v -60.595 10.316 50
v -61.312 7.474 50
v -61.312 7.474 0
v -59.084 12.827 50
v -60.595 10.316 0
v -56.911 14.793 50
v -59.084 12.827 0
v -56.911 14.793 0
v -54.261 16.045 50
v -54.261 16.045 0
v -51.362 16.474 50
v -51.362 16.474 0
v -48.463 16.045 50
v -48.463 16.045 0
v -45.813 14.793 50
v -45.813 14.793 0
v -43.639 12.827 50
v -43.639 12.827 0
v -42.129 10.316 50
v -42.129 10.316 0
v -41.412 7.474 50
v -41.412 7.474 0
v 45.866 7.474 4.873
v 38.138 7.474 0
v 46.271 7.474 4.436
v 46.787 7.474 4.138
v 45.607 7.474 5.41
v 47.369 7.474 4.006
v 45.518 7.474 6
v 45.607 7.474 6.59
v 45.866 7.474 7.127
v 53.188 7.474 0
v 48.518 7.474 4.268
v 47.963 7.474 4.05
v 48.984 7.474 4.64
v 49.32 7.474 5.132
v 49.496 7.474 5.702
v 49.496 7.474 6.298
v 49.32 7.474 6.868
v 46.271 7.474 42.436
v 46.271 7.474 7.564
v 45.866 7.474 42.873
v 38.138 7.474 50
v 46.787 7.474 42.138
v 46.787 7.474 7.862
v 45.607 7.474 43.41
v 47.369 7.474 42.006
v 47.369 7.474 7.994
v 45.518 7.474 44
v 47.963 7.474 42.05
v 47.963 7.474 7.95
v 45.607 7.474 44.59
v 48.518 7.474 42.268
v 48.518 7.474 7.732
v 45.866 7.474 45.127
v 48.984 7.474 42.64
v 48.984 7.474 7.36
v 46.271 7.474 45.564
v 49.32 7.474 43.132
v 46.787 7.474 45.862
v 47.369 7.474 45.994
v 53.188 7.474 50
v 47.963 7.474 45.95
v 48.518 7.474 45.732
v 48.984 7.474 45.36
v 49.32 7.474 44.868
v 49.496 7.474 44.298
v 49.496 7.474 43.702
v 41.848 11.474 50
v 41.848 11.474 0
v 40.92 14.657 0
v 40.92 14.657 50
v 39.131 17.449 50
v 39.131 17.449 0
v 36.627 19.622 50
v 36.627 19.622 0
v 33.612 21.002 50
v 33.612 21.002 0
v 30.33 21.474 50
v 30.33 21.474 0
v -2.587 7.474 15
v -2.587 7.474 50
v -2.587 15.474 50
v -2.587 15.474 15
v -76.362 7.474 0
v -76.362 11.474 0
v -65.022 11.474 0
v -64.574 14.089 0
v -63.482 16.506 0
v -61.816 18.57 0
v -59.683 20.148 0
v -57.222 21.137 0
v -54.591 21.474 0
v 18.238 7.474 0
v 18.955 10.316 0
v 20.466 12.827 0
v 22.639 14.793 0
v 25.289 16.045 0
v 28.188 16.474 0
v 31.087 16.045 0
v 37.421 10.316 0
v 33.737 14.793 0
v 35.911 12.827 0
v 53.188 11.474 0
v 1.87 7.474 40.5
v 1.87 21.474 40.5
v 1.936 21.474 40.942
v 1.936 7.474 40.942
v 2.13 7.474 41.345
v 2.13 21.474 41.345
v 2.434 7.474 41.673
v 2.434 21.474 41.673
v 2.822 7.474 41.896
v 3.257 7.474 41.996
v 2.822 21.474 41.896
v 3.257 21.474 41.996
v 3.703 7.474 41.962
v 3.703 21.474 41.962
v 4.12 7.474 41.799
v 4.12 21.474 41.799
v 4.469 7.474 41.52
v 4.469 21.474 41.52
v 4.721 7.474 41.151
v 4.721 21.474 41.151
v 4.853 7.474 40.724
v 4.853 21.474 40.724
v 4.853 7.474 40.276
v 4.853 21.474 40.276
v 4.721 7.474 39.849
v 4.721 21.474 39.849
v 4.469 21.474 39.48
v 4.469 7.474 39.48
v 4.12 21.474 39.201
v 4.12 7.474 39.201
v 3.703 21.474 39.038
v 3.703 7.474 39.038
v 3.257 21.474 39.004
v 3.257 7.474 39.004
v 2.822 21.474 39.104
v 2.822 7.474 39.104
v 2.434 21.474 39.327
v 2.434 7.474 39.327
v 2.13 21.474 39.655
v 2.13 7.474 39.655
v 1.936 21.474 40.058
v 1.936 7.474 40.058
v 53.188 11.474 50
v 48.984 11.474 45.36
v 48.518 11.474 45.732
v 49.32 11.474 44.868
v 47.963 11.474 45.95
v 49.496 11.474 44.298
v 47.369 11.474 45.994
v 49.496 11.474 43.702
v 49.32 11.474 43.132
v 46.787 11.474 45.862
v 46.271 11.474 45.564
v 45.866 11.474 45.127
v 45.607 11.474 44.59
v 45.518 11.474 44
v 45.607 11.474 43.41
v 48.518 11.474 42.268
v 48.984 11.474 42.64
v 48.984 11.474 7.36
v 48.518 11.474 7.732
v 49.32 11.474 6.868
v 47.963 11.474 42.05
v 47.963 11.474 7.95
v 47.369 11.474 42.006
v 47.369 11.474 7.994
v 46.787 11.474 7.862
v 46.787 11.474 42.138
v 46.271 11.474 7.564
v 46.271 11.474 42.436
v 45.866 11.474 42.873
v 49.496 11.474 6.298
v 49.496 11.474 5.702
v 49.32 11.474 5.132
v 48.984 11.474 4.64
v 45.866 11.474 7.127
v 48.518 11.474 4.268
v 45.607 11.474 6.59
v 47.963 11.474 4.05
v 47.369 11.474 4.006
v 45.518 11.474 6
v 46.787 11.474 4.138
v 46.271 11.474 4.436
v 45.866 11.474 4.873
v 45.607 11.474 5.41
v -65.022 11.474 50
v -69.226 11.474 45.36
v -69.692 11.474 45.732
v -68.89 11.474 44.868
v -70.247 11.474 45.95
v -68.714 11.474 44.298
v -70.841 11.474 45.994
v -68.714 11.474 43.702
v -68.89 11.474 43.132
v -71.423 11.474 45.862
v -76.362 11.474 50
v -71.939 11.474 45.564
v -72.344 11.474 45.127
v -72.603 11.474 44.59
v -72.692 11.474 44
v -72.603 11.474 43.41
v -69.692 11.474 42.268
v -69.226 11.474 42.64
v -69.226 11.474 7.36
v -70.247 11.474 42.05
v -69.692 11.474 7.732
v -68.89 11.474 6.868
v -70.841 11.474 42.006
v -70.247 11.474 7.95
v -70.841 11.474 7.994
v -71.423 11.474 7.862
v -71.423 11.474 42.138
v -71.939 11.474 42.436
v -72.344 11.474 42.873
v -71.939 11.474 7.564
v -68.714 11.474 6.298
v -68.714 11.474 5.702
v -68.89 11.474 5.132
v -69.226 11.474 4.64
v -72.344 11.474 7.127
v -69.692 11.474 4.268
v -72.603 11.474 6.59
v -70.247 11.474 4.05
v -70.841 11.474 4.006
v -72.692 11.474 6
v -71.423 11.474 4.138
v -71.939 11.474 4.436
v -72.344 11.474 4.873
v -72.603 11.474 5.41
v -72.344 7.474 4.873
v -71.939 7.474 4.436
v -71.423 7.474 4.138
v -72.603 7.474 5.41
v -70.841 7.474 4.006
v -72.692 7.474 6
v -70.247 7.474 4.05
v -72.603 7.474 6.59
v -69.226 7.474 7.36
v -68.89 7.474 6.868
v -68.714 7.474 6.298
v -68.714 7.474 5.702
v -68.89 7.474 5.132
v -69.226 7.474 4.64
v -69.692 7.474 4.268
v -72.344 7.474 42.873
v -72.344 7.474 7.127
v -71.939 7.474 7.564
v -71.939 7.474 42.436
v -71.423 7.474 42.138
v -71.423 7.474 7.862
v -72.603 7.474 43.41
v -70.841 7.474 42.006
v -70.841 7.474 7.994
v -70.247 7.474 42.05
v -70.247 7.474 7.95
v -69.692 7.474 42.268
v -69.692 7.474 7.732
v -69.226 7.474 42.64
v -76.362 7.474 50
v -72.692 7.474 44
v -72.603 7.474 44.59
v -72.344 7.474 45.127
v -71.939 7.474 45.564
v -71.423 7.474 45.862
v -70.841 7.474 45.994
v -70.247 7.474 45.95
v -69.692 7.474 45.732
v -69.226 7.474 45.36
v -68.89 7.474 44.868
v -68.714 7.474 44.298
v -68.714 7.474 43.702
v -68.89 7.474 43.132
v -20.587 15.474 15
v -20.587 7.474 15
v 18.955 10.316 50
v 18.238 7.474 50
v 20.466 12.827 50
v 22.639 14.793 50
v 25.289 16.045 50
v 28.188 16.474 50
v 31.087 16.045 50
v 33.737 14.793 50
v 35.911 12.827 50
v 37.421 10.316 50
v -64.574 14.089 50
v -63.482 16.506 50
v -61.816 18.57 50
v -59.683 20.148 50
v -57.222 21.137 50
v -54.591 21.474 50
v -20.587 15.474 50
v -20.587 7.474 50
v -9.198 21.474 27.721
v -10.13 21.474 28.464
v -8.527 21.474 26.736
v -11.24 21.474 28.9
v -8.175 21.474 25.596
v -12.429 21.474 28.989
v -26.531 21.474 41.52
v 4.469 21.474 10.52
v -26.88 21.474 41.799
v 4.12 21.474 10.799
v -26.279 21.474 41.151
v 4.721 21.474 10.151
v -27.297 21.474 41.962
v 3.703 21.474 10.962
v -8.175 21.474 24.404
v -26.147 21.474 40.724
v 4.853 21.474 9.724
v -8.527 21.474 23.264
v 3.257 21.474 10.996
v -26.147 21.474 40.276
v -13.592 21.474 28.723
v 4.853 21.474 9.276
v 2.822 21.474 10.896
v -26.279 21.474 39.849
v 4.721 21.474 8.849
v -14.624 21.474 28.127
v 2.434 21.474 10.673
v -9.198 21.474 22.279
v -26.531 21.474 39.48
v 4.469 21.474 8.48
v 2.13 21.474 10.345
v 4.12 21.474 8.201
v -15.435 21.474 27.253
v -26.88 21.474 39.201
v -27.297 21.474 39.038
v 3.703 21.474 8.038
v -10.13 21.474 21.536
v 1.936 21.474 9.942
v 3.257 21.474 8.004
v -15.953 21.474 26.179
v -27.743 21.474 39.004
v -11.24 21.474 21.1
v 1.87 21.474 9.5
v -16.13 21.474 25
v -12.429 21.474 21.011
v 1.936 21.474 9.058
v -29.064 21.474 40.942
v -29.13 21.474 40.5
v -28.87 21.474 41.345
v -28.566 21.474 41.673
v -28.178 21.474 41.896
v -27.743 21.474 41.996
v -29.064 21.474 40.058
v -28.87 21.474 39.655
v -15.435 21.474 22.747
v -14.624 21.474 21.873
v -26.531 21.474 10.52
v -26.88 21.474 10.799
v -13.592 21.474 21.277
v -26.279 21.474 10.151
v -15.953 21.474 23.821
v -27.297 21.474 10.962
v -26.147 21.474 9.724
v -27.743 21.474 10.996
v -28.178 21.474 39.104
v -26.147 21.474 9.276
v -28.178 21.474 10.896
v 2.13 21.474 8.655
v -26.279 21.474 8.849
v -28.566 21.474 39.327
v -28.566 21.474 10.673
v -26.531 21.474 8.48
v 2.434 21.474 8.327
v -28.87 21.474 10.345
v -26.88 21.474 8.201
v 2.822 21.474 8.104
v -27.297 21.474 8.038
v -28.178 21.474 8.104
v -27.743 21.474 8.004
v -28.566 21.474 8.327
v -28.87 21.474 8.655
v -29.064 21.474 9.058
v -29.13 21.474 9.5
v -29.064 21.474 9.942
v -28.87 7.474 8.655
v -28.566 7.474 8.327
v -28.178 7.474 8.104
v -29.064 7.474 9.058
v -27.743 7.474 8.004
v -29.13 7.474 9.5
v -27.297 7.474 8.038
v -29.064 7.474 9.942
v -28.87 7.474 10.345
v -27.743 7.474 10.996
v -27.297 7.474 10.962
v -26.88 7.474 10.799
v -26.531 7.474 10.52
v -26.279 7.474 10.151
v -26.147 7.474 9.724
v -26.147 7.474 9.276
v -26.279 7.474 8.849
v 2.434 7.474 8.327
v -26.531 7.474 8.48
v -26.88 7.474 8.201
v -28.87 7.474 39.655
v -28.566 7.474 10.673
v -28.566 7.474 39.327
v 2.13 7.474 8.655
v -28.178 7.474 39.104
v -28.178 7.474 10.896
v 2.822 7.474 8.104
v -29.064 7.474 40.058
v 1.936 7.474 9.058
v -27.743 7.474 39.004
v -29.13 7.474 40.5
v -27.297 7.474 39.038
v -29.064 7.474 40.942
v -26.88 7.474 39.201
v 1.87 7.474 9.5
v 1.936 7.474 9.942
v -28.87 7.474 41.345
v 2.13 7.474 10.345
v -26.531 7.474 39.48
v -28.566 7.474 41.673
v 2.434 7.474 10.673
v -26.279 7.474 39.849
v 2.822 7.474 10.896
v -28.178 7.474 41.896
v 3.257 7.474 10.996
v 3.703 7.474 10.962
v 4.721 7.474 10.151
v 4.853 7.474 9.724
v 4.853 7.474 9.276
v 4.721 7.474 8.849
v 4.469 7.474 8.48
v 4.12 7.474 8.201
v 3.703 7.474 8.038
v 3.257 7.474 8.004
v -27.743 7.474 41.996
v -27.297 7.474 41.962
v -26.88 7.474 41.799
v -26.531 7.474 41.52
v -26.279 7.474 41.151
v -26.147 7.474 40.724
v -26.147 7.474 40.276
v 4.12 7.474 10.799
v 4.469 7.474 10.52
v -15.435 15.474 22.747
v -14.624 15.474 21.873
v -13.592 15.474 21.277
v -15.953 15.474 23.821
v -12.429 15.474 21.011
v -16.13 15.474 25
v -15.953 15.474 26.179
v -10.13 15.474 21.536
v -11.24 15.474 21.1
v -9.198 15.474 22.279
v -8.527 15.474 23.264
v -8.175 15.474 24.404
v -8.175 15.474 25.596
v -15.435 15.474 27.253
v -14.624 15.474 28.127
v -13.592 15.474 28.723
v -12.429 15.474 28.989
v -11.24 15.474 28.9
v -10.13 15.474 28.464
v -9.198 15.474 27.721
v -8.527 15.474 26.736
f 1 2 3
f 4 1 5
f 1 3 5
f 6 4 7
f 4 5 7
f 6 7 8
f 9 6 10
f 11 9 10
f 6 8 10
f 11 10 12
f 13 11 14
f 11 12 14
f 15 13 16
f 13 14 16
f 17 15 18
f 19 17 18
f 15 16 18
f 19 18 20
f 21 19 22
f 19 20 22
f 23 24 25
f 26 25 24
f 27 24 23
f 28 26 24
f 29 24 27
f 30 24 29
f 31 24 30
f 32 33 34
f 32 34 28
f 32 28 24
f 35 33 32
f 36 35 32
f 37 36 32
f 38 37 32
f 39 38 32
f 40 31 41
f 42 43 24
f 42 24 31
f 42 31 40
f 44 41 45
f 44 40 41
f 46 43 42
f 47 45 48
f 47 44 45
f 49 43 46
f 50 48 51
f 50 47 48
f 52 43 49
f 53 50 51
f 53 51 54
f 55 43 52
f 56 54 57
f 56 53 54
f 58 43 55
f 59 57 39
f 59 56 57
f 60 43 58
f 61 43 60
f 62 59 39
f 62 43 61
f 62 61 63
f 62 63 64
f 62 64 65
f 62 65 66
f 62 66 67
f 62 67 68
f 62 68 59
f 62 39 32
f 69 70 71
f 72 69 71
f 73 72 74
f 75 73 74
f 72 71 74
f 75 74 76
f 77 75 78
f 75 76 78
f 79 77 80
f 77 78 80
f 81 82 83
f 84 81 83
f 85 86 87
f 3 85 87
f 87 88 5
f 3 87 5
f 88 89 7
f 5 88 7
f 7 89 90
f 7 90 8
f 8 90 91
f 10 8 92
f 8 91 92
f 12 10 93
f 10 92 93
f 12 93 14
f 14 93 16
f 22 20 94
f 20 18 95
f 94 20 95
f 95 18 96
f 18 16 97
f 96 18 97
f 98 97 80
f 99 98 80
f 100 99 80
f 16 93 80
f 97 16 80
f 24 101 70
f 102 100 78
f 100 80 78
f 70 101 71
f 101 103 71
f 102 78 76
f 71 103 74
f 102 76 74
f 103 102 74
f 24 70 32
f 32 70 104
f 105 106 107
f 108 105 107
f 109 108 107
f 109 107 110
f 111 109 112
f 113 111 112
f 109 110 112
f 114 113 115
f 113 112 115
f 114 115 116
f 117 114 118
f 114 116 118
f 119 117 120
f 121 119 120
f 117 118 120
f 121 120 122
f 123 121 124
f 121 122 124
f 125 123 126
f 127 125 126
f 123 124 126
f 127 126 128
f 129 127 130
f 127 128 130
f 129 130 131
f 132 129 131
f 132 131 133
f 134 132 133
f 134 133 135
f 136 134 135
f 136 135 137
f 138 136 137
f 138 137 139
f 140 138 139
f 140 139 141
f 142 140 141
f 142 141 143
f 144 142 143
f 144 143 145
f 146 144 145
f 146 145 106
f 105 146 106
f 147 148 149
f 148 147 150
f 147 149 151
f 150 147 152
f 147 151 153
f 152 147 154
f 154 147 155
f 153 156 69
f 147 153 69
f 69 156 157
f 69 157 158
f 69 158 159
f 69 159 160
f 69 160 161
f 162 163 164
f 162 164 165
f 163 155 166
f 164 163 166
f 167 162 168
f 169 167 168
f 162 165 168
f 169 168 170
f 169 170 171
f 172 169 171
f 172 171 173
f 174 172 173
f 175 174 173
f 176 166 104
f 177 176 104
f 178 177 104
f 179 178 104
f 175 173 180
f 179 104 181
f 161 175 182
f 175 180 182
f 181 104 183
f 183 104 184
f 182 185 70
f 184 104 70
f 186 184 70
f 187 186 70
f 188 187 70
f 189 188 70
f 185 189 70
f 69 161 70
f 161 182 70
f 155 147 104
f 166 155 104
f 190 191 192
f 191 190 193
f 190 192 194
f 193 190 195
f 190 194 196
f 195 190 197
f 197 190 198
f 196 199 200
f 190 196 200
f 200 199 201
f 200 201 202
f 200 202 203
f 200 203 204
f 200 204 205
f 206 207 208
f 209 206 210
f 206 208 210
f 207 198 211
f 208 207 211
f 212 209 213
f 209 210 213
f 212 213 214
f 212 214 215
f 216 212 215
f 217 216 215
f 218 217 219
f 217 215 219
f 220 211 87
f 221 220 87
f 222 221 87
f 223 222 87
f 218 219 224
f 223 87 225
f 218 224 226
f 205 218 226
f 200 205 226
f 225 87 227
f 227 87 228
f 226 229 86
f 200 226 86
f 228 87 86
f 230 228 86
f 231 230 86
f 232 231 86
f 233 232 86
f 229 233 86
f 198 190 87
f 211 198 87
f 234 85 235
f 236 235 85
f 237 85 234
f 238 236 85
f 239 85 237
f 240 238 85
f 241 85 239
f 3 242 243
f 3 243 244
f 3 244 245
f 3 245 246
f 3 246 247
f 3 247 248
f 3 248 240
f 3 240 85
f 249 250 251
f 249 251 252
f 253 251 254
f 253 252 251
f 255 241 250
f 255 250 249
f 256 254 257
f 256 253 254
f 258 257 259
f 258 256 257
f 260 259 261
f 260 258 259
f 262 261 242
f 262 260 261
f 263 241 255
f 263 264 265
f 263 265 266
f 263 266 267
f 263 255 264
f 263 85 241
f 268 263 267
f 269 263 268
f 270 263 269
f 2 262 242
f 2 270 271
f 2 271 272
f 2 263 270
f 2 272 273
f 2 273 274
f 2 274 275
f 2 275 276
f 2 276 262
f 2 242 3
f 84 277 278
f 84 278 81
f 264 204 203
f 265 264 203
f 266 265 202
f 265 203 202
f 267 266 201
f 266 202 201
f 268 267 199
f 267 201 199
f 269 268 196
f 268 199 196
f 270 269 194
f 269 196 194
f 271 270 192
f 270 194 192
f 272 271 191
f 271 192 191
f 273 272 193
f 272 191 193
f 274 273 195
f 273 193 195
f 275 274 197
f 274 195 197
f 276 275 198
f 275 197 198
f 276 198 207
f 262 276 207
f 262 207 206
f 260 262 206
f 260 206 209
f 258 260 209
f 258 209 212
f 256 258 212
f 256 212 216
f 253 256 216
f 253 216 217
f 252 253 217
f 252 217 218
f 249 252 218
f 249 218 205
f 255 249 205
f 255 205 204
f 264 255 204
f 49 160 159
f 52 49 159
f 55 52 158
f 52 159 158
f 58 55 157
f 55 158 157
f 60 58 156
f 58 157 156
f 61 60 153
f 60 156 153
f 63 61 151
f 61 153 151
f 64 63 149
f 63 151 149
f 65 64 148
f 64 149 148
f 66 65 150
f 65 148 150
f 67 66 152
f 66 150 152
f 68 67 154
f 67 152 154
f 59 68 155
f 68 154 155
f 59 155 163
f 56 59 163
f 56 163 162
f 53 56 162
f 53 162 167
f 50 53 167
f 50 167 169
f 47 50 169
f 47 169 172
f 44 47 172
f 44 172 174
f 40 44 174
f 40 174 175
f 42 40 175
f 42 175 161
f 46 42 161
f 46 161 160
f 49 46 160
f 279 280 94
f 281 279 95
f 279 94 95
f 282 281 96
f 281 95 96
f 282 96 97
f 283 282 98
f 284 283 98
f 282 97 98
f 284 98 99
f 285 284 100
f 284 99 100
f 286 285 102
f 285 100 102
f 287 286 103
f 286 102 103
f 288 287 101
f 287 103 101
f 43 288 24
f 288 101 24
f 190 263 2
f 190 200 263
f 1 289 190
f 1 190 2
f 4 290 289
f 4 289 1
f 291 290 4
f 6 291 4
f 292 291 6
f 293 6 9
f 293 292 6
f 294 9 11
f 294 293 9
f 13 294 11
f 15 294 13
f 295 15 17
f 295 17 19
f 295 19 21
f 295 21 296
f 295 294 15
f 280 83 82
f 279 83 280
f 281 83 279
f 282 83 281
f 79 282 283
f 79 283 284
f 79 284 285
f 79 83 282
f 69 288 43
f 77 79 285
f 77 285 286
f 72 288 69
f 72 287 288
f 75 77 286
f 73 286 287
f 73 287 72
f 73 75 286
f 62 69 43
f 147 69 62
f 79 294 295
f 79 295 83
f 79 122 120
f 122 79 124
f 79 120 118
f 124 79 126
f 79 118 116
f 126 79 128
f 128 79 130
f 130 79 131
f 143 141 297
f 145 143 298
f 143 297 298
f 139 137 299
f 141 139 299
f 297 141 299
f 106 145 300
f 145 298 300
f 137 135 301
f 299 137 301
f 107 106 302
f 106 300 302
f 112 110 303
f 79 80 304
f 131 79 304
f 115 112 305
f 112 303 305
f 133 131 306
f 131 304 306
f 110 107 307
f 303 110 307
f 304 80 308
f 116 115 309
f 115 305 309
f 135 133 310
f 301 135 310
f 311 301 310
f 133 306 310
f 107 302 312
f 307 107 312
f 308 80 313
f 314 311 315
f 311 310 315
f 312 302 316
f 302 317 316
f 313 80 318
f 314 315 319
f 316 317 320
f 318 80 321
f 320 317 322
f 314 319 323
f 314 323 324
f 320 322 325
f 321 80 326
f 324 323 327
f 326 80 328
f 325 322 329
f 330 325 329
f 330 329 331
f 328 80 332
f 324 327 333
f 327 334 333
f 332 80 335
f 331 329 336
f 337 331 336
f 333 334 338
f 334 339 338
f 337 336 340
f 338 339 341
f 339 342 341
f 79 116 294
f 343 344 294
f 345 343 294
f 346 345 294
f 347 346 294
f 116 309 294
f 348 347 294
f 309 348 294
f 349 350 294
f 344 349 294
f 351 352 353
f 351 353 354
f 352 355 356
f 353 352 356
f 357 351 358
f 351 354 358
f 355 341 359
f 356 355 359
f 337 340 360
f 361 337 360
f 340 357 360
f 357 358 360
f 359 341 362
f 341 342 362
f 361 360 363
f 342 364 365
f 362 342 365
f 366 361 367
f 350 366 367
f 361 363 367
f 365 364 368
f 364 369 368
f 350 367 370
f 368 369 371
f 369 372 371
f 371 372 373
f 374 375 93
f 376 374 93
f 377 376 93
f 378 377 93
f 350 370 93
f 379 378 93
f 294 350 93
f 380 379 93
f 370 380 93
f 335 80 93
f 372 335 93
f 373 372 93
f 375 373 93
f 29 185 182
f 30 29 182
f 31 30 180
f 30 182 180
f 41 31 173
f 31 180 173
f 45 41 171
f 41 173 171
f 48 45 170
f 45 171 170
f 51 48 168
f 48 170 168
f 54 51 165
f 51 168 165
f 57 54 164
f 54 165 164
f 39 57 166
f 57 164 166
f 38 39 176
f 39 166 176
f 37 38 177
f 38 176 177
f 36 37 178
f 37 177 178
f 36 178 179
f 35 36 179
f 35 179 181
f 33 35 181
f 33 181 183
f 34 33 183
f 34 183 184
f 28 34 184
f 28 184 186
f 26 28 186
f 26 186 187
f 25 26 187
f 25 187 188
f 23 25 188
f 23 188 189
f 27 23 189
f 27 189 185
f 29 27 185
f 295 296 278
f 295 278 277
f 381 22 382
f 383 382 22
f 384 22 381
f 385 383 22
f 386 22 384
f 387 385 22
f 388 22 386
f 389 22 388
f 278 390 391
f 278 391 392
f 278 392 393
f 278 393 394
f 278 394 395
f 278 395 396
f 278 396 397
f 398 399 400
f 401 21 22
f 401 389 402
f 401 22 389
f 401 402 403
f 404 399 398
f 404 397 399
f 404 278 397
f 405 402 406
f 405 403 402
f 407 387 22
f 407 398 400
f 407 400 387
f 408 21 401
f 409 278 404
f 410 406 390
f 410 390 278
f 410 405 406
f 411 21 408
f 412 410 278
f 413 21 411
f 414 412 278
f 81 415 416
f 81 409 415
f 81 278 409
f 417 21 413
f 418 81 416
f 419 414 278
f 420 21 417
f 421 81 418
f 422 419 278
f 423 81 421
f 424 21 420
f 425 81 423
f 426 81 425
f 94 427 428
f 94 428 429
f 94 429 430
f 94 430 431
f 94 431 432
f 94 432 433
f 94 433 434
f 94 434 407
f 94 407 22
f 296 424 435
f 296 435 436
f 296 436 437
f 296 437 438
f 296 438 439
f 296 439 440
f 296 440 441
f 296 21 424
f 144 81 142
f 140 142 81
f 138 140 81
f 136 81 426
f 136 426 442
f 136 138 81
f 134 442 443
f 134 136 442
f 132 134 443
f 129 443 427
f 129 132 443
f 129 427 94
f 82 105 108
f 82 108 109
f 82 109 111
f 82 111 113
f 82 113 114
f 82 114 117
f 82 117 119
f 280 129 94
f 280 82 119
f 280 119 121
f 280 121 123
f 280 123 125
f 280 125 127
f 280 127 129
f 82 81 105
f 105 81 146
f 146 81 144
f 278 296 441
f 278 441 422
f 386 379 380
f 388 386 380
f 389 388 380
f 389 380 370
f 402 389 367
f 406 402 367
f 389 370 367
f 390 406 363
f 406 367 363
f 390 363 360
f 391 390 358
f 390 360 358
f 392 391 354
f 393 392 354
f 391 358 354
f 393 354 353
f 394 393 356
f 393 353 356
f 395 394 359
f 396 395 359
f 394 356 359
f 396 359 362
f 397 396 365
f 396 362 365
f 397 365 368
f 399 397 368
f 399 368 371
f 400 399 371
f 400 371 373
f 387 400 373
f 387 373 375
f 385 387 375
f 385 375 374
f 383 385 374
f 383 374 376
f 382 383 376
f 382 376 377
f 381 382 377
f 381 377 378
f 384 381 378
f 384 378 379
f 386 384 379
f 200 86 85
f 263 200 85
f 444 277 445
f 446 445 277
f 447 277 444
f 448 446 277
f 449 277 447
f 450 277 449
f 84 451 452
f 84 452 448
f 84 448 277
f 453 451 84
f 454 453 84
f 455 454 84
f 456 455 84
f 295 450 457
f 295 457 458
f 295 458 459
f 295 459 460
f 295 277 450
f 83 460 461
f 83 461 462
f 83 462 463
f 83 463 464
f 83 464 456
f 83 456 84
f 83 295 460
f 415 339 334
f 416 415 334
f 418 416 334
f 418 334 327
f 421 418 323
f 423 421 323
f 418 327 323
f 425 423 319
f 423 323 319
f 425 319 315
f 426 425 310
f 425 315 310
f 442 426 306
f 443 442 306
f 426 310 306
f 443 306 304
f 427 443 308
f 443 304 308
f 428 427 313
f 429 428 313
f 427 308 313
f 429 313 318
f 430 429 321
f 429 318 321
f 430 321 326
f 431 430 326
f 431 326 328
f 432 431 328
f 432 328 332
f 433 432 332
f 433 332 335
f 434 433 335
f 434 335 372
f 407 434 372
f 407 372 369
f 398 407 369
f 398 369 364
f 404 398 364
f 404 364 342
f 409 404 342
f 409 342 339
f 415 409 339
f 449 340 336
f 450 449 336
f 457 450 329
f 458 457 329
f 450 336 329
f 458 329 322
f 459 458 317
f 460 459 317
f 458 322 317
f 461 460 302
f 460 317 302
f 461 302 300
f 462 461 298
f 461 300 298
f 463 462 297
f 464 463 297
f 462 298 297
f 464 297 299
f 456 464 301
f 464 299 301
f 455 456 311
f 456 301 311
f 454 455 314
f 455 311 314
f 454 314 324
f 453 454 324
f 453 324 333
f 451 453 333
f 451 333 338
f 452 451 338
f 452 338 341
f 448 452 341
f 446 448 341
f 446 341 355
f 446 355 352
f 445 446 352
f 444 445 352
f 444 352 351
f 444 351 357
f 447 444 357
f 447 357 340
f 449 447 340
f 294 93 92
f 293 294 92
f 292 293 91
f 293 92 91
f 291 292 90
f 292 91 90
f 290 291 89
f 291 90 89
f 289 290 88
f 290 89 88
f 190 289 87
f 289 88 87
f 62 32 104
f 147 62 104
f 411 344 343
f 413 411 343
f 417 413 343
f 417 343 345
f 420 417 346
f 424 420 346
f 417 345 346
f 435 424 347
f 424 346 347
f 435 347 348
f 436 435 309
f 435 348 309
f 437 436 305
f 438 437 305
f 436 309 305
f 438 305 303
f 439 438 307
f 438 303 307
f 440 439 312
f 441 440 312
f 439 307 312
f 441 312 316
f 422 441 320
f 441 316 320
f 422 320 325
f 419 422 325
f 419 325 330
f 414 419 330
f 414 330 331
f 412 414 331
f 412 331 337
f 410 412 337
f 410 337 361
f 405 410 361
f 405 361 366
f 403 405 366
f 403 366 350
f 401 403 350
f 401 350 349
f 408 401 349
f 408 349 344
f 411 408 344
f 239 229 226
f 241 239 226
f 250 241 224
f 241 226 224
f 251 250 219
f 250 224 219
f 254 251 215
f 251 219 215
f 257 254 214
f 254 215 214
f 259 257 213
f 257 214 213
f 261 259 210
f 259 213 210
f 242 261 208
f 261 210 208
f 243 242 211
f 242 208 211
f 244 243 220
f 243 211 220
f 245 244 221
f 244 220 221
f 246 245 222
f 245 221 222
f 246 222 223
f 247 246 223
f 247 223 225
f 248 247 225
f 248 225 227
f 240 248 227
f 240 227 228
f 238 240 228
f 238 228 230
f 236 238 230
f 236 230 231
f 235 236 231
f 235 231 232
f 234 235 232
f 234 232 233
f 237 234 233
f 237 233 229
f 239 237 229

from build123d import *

# Parameters (mm, degrees)
ESTRUSIONE_ESTRUSIONE1_DEPTH = 50
SCHIZZO2_R                   = 2
TAGLIO_ESTRUSIONE1_DEPTH     = 92.821204916
SCHIZZO3_W                   = 18
SCHIZZO3_H                   = 9
TAGLIO_ESTRUSIONE2_DEPTH     = 35
SCHIZZO4_R                   = 4
SCHIZZO4_R_2                 = 1.5
TAGLIO_ESTRUSIONE3_DEPTH     = 93.4993712
SCHIZZO5_W                   = 129.55
SCHIZZO5_H                   = 1
TAGLIO_ESTRUSIONE4_DEPTH     = 94.767096332


with BuildPart() as part:
    # Schizzo1 → Estrusione-Estrusione1 (new body)
    with BuildSketch(Plane.XY):
        with BuildLine():
            Line((-41.361860063, 6.474046711), (18.188139937, 6.474046711))
            ThreePointArc((18.188139937, 6.474046711), (28.188139937, 16.474046711), (38.188139937, 6.474046711))
            Line((38.188139937, 6.474046711), (53.188139937, 6.474046711))
            Line((53.188139937, 6.474046711), (53.188139937, 11.474046711))
            Line((53.188139937, 11.474046711), (41.848393975, 11.474046711))
            ThreePointArc((41.848393975, 11.474046711), (37.956863927, 18.625242568), (30.330074087, 21.474046711))
            Line((30.330074087, 21.474046711), (-54.59096633, 21.474046711))
            ThreePointArc((-54.59096633, 21.474046711), (-61.816076084, 18.57022327), (-65.022114101, 11.474046711))
            Line((-65.022114101, 11.474046711), (-76.361860063, 11.474046711))
            Line((-76.361860063, 11.474046711), (-76.361860063, 6.474046711))
            Line((-76.361860063, 6.474046711), (-61.361860063, 6.474046711))
            ThreePointArc((-61.361860063, 6.474046711), (-51.361860063, 16.474046711), (-41.361860063, 6.474046711))
        make_face()
    extrude(amount=ESTRUSIONE_ESTRUSIONE1_DEPTH)

    # Schizzo2 → Taglio-Estrusione1 (cut, through all)
    with BuildSketch(Plane(origin=(0, 11.474046711, 0), x_dir=(1, 0, 0), z_dir=(0, 1, 0))):
        with Locations(Location((-70.691860063, -6, 0), (0, 0, 180))):
            Circle(SCHIZZO2_R)
        with Locations(Location((-70.691860063, -44, 0), (0, 0, 180))):
            Circle(SCHIZZO2_R)
        with Locations(Location((47.518139937, -6, 0), (0, 0, 180))):
            Circle(SCHIZZO2_R)
        with Locations(Location((47.518139937, -44, 0), (0, 0, 180))):
            Circle(SCHIZZO2_R)
    extrude(amount=-TAGLIO_ESTRUSIONE1_DEPTH, mode=Mode.SUBTRACT)

    # Schizzo3 → Taglio-Estrusione2 (cut)
    with BuildSketch(Plane.XY.offset(50)):
        with Locations((-11.586860063, 10.974046711)):
            Rectangle(SCHIZZO3_W, SCHIZZO3_H)
    extrude(amount=-TAGLIO_ESTRUSIONE2_DEPTH, mode=Mode.SUBTRACT)

    # Schizzo4 → Taglio-Estrusione3 (cut, through all)
    with BuildSketch(Plane(origin=(0, 21.474046711, 0), x_dir=(1, 0, 0), z_dir=(0, 1, 0))):
        with Locations(Location((-12.130446122, -25, 0), (0, 0, 180))):
            Circle(SCHIZZO4_R)
        with Locations(Location((-27.630446122, -9.5, 0), (0, 0, 180))):
            Circle(SCHIZZO4_R_2)
        with Locations(Location((3.369553878, -9.5, 0), (0, 0, 180))):
            Circle(SCHIZZO4_R_2)
        with Locations(Location((3.369553878, -40.5, 0), (0, 0, 180))):
            Circle(SCHIZZO4_R_2)
        with Locations(Location((-27.630446122, -40.5, 0), (0, 0, 180))):
            Circle(SCHIZZO4_R_2)
    extrude(amount=-TAGLIO_ESTRUSIONE3_DEPTH, mode=Mode.SUBTRACT)

    # Schizzo5 → Taglio-Estrusione4 (cut, through all)
    with BuildSketch(Plane.XY.offset(50)):
        with Locations((-11.586860063, 6.974046711)):
            Rectangle(SCHIZZO5_W, SCHIZZO5_H)
    extrude(amount=-TAGLIO_ESTRUSIONE4_DEPTH, mode=Mode.SUBTRACT)


solid = part.part
